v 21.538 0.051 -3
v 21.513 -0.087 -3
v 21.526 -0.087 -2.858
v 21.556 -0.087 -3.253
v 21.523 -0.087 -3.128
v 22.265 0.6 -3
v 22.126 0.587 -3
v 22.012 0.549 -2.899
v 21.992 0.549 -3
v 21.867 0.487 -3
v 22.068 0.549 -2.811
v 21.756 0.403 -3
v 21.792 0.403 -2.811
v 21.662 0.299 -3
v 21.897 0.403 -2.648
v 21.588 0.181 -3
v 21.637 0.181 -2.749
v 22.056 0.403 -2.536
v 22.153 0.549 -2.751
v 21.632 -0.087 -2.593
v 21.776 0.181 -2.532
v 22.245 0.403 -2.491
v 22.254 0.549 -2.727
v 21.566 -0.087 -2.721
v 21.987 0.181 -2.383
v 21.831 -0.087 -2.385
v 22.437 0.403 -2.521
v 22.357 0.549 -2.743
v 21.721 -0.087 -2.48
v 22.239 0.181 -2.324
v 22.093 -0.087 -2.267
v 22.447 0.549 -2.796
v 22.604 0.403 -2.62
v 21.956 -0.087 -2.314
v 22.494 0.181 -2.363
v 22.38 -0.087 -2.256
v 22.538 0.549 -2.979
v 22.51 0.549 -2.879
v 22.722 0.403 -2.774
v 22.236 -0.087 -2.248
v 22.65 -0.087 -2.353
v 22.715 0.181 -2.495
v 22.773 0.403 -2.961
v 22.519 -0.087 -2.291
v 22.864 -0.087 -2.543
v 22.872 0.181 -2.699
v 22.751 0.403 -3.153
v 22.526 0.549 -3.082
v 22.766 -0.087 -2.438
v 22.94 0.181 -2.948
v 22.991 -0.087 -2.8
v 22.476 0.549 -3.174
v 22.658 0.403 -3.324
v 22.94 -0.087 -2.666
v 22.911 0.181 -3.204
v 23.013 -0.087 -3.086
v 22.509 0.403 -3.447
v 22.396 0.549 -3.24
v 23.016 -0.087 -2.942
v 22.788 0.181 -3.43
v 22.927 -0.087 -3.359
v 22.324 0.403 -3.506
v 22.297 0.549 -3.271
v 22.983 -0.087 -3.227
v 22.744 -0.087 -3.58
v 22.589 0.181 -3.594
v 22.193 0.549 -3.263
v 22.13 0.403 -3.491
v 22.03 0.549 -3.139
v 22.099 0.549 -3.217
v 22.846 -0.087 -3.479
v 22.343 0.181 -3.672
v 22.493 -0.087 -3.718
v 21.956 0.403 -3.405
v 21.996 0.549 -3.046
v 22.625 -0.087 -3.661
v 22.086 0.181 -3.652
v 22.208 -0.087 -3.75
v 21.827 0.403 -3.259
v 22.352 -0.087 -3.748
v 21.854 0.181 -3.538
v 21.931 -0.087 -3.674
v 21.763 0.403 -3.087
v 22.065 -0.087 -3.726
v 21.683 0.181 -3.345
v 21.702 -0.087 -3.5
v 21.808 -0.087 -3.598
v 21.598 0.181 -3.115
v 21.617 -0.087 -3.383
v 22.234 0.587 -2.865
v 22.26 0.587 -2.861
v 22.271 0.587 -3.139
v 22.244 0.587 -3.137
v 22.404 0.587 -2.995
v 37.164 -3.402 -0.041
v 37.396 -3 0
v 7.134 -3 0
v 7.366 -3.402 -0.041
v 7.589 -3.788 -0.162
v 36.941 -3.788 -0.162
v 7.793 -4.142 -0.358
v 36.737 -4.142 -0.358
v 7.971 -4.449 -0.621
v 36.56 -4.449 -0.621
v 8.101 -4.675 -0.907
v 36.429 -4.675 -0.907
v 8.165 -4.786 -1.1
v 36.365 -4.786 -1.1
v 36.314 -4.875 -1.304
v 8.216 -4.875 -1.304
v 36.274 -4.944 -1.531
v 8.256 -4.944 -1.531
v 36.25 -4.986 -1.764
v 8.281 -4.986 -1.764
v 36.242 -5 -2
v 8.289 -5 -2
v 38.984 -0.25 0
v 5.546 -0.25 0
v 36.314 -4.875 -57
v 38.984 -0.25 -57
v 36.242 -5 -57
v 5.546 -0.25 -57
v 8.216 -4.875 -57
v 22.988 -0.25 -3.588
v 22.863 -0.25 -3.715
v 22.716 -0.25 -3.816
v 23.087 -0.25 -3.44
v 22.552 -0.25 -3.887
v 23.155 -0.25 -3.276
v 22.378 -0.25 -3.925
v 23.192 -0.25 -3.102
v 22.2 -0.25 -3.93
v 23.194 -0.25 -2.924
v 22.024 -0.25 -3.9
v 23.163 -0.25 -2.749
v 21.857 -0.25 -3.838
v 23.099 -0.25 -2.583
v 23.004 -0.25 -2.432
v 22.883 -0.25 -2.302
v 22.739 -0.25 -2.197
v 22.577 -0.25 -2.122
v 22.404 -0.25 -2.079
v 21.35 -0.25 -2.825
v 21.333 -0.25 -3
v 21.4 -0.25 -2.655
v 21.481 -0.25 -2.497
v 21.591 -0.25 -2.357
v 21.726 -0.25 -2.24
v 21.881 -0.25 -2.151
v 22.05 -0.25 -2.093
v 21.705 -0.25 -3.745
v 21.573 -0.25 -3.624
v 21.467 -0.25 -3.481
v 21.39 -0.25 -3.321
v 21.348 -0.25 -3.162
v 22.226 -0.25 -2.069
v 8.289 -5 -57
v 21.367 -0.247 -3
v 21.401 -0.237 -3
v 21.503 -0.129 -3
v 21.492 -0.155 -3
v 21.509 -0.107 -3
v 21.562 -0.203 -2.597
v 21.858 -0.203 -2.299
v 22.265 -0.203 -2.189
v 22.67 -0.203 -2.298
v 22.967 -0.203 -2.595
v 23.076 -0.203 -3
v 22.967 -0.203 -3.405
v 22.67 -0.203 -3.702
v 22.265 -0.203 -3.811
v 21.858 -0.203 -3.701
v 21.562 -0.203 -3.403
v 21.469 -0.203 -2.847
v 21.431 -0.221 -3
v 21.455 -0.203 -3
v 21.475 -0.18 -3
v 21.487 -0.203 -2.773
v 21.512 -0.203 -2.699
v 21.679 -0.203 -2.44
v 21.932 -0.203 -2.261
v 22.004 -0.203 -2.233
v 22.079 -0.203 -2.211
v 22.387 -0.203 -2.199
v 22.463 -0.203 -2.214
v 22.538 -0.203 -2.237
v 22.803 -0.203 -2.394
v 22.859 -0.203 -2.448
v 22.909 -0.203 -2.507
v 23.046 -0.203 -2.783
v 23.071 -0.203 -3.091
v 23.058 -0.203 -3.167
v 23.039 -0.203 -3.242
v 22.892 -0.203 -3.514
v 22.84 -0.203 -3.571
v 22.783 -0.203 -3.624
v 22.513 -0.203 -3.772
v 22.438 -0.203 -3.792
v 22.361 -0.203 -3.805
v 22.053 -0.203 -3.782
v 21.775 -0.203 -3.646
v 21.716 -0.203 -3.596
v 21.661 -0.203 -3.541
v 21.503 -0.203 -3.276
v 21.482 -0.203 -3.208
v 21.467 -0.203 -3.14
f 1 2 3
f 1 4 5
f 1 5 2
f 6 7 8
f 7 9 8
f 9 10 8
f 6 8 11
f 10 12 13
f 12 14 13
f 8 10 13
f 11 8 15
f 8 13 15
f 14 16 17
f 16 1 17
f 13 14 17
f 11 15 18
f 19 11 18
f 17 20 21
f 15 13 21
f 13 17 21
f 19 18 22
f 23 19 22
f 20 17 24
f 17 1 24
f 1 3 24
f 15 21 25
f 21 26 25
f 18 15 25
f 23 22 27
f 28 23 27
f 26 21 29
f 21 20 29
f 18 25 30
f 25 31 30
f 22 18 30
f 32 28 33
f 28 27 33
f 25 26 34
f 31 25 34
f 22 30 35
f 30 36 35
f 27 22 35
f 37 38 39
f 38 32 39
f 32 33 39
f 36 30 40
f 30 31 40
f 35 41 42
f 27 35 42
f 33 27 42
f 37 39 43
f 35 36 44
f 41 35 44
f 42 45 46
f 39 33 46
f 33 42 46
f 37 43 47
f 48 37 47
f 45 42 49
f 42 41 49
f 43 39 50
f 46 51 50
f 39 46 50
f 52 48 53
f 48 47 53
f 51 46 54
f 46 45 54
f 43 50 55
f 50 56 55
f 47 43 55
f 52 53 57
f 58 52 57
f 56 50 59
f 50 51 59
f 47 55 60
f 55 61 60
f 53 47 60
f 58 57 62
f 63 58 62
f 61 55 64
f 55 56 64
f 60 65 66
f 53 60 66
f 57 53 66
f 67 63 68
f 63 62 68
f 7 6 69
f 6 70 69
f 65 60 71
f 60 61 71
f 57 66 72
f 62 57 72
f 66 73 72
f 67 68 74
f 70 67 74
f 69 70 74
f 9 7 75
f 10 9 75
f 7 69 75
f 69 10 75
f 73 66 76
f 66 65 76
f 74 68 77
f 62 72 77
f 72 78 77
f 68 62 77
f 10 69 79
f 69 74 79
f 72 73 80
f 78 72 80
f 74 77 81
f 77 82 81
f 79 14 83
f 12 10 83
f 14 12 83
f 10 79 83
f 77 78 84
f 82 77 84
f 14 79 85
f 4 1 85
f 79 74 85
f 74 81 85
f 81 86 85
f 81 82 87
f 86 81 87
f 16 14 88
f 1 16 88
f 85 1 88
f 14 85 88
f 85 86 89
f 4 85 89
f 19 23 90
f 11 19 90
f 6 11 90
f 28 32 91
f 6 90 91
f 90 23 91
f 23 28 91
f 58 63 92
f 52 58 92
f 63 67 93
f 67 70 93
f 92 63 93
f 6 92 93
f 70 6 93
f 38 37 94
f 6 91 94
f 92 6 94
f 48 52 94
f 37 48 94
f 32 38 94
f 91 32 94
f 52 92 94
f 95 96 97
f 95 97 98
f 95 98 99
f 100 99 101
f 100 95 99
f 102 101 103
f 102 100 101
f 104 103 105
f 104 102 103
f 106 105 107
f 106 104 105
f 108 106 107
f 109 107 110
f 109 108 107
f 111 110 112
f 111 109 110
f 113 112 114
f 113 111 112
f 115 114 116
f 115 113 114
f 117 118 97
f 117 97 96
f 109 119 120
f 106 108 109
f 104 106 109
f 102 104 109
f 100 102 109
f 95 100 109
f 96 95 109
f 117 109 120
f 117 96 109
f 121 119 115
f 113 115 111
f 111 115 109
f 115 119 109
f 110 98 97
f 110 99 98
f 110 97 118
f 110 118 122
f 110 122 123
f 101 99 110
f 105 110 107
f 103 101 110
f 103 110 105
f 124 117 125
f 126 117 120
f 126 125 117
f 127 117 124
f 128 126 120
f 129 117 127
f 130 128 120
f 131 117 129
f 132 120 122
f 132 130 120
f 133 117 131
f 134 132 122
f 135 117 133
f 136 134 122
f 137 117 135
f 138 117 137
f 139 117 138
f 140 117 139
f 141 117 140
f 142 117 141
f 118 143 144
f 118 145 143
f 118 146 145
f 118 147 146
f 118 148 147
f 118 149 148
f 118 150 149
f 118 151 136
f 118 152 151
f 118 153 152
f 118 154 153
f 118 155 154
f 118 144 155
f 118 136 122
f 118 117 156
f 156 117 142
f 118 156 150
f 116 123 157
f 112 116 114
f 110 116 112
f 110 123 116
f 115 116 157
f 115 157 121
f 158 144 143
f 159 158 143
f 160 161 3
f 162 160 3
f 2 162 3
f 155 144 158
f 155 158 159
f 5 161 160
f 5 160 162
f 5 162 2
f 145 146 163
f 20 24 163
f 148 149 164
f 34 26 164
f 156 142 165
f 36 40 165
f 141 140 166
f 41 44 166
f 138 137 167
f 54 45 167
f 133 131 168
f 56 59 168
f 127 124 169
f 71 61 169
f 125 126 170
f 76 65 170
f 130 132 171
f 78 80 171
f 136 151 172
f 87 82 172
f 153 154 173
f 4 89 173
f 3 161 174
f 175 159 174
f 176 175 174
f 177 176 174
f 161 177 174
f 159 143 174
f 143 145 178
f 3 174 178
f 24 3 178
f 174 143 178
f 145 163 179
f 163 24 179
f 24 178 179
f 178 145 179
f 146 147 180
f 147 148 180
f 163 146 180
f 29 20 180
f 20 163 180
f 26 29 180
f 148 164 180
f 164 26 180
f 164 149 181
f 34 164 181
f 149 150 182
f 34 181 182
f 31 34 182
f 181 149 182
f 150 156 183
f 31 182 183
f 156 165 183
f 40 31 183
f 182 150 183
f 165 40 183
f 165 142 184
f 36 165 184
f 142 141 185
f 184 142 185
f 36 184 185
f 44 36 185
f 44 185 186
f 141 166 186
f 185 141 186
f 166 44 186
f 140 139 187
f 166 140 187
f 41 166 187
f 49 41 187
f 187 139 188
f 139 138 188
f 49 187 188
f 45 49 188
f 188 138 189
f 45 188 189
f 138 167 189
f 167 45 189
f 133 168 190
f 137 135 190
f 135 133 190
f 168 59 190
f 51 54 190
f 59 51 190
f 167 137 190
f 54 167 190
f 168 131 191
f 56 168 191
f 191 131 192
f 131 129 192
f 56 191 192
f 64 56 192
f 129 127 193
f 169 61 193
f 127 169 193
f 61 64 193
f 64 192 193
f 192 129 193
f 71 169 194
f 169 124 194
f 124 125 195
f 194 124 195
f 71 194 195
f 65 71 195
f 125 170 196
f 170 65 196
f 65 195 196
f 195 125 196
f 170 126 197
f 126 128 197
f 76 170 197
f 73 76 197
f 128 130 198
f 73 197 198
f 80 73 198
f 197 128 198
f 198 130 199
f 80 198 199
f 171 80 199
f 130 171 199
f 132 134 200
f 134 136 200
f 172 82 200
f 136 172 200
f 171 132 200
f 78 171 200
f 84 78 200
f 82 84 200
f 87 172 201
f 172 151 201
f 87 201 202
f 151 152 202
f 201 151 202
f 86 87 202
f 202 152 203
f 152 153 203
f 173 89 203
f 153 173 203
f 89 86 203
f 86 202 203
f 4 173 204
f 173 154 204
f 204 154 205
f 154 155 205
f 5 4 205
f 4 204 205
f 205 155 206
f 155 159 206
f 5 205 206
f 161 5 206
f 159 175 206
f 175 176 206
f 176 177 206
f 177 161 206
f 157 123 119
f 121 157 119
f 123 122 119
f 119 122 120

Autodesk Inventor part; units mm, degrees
ref_plane "YZ Plane" through (0, 0, 0) normal (1, 0, 0) x (0, 1, 0)
ref_plane "XZ Plane" through (0, 0, 0) normal (0, 1, 0) x (-1, 0, 0)
sketch "Sketch1" plane through (0, 0, 0) normal (0, 0, 1) x (1, 0, 0)
  line L0 (39.4171, 0) -> (37.6851, -3) projected
  line L1 (6.8453, -3) -> (5.1132, 0) projected
  line L2 (5.1132, 0) -> (39.4171, 0) projected
  line L3 (36.3139, -4.875) -> (38.9841, -0.25)
  line L4 (38.9841, -0.25) -> (5.5463, -0.25)
  line L5 (5.5463, -0.25) -> (8.2165, -4.875)
  line L6 (36.3139, -4.875) -> (36.2417, -5)
  line L7 (8.2165, -4.875) -> (8.2887, -5)
  line L8 (8.2887, -5) -> (36.2417, -5)
  point P0 (0, 0)
  dimension "d0" = 0.25
  dimension "d1" = 4.75
extrude "Extrusion1" add sketch "Sketch1" against normal blind 57
sketch "Sketch2" plane through (5.5463, -0.25, 0) normal (0, 1, 0) x (1, 0, 0)
  circle A0 centre (16.7189, 3) radius 0.922 projected
  point P0 (-5.5463, 0)
ref_plane "Work Plane1" through (22.2652, -0.25, -3) normal (0, 0, 1) x (1, 0, 0)
sketch "Sketch3" plane through (22.2652, -0.25, -3) normal (0, 0, 1) x (1, 0, 0)
  line L0 (-16.7189, 0) -> (16.7189, 0) construction
  line L1 (0, 0) -> (0, 0.85) construction
  arc A0 (0.7775, 0.3597) -> (-0.7775, 0.3597) centre (0, 0.1429) ccw construction
  arc A1 (0, 0.85) -> (-0.75, 0) centre (0, 0.0941) ccw
  line L2 (-0.75, 0) -> (0, 0)
  line L3 (0, 0) -> (0, 0.85)
  point P0 (-22.2652, 0.25)
  dimension "d4" = 0.85
  dimension "d5" = 0.75
revolve "Revolution1" add sketch "Sketch3" angle 360 about axis through (22.2652, -0.25, -3) along (0, 1, 0)
fillet "Fillet1" radius 0.18 1 edges at (23.0152, -0.25, -3)
fillet "Fillet2" radius 2 1 edges at (22.2652, -5, 0)
